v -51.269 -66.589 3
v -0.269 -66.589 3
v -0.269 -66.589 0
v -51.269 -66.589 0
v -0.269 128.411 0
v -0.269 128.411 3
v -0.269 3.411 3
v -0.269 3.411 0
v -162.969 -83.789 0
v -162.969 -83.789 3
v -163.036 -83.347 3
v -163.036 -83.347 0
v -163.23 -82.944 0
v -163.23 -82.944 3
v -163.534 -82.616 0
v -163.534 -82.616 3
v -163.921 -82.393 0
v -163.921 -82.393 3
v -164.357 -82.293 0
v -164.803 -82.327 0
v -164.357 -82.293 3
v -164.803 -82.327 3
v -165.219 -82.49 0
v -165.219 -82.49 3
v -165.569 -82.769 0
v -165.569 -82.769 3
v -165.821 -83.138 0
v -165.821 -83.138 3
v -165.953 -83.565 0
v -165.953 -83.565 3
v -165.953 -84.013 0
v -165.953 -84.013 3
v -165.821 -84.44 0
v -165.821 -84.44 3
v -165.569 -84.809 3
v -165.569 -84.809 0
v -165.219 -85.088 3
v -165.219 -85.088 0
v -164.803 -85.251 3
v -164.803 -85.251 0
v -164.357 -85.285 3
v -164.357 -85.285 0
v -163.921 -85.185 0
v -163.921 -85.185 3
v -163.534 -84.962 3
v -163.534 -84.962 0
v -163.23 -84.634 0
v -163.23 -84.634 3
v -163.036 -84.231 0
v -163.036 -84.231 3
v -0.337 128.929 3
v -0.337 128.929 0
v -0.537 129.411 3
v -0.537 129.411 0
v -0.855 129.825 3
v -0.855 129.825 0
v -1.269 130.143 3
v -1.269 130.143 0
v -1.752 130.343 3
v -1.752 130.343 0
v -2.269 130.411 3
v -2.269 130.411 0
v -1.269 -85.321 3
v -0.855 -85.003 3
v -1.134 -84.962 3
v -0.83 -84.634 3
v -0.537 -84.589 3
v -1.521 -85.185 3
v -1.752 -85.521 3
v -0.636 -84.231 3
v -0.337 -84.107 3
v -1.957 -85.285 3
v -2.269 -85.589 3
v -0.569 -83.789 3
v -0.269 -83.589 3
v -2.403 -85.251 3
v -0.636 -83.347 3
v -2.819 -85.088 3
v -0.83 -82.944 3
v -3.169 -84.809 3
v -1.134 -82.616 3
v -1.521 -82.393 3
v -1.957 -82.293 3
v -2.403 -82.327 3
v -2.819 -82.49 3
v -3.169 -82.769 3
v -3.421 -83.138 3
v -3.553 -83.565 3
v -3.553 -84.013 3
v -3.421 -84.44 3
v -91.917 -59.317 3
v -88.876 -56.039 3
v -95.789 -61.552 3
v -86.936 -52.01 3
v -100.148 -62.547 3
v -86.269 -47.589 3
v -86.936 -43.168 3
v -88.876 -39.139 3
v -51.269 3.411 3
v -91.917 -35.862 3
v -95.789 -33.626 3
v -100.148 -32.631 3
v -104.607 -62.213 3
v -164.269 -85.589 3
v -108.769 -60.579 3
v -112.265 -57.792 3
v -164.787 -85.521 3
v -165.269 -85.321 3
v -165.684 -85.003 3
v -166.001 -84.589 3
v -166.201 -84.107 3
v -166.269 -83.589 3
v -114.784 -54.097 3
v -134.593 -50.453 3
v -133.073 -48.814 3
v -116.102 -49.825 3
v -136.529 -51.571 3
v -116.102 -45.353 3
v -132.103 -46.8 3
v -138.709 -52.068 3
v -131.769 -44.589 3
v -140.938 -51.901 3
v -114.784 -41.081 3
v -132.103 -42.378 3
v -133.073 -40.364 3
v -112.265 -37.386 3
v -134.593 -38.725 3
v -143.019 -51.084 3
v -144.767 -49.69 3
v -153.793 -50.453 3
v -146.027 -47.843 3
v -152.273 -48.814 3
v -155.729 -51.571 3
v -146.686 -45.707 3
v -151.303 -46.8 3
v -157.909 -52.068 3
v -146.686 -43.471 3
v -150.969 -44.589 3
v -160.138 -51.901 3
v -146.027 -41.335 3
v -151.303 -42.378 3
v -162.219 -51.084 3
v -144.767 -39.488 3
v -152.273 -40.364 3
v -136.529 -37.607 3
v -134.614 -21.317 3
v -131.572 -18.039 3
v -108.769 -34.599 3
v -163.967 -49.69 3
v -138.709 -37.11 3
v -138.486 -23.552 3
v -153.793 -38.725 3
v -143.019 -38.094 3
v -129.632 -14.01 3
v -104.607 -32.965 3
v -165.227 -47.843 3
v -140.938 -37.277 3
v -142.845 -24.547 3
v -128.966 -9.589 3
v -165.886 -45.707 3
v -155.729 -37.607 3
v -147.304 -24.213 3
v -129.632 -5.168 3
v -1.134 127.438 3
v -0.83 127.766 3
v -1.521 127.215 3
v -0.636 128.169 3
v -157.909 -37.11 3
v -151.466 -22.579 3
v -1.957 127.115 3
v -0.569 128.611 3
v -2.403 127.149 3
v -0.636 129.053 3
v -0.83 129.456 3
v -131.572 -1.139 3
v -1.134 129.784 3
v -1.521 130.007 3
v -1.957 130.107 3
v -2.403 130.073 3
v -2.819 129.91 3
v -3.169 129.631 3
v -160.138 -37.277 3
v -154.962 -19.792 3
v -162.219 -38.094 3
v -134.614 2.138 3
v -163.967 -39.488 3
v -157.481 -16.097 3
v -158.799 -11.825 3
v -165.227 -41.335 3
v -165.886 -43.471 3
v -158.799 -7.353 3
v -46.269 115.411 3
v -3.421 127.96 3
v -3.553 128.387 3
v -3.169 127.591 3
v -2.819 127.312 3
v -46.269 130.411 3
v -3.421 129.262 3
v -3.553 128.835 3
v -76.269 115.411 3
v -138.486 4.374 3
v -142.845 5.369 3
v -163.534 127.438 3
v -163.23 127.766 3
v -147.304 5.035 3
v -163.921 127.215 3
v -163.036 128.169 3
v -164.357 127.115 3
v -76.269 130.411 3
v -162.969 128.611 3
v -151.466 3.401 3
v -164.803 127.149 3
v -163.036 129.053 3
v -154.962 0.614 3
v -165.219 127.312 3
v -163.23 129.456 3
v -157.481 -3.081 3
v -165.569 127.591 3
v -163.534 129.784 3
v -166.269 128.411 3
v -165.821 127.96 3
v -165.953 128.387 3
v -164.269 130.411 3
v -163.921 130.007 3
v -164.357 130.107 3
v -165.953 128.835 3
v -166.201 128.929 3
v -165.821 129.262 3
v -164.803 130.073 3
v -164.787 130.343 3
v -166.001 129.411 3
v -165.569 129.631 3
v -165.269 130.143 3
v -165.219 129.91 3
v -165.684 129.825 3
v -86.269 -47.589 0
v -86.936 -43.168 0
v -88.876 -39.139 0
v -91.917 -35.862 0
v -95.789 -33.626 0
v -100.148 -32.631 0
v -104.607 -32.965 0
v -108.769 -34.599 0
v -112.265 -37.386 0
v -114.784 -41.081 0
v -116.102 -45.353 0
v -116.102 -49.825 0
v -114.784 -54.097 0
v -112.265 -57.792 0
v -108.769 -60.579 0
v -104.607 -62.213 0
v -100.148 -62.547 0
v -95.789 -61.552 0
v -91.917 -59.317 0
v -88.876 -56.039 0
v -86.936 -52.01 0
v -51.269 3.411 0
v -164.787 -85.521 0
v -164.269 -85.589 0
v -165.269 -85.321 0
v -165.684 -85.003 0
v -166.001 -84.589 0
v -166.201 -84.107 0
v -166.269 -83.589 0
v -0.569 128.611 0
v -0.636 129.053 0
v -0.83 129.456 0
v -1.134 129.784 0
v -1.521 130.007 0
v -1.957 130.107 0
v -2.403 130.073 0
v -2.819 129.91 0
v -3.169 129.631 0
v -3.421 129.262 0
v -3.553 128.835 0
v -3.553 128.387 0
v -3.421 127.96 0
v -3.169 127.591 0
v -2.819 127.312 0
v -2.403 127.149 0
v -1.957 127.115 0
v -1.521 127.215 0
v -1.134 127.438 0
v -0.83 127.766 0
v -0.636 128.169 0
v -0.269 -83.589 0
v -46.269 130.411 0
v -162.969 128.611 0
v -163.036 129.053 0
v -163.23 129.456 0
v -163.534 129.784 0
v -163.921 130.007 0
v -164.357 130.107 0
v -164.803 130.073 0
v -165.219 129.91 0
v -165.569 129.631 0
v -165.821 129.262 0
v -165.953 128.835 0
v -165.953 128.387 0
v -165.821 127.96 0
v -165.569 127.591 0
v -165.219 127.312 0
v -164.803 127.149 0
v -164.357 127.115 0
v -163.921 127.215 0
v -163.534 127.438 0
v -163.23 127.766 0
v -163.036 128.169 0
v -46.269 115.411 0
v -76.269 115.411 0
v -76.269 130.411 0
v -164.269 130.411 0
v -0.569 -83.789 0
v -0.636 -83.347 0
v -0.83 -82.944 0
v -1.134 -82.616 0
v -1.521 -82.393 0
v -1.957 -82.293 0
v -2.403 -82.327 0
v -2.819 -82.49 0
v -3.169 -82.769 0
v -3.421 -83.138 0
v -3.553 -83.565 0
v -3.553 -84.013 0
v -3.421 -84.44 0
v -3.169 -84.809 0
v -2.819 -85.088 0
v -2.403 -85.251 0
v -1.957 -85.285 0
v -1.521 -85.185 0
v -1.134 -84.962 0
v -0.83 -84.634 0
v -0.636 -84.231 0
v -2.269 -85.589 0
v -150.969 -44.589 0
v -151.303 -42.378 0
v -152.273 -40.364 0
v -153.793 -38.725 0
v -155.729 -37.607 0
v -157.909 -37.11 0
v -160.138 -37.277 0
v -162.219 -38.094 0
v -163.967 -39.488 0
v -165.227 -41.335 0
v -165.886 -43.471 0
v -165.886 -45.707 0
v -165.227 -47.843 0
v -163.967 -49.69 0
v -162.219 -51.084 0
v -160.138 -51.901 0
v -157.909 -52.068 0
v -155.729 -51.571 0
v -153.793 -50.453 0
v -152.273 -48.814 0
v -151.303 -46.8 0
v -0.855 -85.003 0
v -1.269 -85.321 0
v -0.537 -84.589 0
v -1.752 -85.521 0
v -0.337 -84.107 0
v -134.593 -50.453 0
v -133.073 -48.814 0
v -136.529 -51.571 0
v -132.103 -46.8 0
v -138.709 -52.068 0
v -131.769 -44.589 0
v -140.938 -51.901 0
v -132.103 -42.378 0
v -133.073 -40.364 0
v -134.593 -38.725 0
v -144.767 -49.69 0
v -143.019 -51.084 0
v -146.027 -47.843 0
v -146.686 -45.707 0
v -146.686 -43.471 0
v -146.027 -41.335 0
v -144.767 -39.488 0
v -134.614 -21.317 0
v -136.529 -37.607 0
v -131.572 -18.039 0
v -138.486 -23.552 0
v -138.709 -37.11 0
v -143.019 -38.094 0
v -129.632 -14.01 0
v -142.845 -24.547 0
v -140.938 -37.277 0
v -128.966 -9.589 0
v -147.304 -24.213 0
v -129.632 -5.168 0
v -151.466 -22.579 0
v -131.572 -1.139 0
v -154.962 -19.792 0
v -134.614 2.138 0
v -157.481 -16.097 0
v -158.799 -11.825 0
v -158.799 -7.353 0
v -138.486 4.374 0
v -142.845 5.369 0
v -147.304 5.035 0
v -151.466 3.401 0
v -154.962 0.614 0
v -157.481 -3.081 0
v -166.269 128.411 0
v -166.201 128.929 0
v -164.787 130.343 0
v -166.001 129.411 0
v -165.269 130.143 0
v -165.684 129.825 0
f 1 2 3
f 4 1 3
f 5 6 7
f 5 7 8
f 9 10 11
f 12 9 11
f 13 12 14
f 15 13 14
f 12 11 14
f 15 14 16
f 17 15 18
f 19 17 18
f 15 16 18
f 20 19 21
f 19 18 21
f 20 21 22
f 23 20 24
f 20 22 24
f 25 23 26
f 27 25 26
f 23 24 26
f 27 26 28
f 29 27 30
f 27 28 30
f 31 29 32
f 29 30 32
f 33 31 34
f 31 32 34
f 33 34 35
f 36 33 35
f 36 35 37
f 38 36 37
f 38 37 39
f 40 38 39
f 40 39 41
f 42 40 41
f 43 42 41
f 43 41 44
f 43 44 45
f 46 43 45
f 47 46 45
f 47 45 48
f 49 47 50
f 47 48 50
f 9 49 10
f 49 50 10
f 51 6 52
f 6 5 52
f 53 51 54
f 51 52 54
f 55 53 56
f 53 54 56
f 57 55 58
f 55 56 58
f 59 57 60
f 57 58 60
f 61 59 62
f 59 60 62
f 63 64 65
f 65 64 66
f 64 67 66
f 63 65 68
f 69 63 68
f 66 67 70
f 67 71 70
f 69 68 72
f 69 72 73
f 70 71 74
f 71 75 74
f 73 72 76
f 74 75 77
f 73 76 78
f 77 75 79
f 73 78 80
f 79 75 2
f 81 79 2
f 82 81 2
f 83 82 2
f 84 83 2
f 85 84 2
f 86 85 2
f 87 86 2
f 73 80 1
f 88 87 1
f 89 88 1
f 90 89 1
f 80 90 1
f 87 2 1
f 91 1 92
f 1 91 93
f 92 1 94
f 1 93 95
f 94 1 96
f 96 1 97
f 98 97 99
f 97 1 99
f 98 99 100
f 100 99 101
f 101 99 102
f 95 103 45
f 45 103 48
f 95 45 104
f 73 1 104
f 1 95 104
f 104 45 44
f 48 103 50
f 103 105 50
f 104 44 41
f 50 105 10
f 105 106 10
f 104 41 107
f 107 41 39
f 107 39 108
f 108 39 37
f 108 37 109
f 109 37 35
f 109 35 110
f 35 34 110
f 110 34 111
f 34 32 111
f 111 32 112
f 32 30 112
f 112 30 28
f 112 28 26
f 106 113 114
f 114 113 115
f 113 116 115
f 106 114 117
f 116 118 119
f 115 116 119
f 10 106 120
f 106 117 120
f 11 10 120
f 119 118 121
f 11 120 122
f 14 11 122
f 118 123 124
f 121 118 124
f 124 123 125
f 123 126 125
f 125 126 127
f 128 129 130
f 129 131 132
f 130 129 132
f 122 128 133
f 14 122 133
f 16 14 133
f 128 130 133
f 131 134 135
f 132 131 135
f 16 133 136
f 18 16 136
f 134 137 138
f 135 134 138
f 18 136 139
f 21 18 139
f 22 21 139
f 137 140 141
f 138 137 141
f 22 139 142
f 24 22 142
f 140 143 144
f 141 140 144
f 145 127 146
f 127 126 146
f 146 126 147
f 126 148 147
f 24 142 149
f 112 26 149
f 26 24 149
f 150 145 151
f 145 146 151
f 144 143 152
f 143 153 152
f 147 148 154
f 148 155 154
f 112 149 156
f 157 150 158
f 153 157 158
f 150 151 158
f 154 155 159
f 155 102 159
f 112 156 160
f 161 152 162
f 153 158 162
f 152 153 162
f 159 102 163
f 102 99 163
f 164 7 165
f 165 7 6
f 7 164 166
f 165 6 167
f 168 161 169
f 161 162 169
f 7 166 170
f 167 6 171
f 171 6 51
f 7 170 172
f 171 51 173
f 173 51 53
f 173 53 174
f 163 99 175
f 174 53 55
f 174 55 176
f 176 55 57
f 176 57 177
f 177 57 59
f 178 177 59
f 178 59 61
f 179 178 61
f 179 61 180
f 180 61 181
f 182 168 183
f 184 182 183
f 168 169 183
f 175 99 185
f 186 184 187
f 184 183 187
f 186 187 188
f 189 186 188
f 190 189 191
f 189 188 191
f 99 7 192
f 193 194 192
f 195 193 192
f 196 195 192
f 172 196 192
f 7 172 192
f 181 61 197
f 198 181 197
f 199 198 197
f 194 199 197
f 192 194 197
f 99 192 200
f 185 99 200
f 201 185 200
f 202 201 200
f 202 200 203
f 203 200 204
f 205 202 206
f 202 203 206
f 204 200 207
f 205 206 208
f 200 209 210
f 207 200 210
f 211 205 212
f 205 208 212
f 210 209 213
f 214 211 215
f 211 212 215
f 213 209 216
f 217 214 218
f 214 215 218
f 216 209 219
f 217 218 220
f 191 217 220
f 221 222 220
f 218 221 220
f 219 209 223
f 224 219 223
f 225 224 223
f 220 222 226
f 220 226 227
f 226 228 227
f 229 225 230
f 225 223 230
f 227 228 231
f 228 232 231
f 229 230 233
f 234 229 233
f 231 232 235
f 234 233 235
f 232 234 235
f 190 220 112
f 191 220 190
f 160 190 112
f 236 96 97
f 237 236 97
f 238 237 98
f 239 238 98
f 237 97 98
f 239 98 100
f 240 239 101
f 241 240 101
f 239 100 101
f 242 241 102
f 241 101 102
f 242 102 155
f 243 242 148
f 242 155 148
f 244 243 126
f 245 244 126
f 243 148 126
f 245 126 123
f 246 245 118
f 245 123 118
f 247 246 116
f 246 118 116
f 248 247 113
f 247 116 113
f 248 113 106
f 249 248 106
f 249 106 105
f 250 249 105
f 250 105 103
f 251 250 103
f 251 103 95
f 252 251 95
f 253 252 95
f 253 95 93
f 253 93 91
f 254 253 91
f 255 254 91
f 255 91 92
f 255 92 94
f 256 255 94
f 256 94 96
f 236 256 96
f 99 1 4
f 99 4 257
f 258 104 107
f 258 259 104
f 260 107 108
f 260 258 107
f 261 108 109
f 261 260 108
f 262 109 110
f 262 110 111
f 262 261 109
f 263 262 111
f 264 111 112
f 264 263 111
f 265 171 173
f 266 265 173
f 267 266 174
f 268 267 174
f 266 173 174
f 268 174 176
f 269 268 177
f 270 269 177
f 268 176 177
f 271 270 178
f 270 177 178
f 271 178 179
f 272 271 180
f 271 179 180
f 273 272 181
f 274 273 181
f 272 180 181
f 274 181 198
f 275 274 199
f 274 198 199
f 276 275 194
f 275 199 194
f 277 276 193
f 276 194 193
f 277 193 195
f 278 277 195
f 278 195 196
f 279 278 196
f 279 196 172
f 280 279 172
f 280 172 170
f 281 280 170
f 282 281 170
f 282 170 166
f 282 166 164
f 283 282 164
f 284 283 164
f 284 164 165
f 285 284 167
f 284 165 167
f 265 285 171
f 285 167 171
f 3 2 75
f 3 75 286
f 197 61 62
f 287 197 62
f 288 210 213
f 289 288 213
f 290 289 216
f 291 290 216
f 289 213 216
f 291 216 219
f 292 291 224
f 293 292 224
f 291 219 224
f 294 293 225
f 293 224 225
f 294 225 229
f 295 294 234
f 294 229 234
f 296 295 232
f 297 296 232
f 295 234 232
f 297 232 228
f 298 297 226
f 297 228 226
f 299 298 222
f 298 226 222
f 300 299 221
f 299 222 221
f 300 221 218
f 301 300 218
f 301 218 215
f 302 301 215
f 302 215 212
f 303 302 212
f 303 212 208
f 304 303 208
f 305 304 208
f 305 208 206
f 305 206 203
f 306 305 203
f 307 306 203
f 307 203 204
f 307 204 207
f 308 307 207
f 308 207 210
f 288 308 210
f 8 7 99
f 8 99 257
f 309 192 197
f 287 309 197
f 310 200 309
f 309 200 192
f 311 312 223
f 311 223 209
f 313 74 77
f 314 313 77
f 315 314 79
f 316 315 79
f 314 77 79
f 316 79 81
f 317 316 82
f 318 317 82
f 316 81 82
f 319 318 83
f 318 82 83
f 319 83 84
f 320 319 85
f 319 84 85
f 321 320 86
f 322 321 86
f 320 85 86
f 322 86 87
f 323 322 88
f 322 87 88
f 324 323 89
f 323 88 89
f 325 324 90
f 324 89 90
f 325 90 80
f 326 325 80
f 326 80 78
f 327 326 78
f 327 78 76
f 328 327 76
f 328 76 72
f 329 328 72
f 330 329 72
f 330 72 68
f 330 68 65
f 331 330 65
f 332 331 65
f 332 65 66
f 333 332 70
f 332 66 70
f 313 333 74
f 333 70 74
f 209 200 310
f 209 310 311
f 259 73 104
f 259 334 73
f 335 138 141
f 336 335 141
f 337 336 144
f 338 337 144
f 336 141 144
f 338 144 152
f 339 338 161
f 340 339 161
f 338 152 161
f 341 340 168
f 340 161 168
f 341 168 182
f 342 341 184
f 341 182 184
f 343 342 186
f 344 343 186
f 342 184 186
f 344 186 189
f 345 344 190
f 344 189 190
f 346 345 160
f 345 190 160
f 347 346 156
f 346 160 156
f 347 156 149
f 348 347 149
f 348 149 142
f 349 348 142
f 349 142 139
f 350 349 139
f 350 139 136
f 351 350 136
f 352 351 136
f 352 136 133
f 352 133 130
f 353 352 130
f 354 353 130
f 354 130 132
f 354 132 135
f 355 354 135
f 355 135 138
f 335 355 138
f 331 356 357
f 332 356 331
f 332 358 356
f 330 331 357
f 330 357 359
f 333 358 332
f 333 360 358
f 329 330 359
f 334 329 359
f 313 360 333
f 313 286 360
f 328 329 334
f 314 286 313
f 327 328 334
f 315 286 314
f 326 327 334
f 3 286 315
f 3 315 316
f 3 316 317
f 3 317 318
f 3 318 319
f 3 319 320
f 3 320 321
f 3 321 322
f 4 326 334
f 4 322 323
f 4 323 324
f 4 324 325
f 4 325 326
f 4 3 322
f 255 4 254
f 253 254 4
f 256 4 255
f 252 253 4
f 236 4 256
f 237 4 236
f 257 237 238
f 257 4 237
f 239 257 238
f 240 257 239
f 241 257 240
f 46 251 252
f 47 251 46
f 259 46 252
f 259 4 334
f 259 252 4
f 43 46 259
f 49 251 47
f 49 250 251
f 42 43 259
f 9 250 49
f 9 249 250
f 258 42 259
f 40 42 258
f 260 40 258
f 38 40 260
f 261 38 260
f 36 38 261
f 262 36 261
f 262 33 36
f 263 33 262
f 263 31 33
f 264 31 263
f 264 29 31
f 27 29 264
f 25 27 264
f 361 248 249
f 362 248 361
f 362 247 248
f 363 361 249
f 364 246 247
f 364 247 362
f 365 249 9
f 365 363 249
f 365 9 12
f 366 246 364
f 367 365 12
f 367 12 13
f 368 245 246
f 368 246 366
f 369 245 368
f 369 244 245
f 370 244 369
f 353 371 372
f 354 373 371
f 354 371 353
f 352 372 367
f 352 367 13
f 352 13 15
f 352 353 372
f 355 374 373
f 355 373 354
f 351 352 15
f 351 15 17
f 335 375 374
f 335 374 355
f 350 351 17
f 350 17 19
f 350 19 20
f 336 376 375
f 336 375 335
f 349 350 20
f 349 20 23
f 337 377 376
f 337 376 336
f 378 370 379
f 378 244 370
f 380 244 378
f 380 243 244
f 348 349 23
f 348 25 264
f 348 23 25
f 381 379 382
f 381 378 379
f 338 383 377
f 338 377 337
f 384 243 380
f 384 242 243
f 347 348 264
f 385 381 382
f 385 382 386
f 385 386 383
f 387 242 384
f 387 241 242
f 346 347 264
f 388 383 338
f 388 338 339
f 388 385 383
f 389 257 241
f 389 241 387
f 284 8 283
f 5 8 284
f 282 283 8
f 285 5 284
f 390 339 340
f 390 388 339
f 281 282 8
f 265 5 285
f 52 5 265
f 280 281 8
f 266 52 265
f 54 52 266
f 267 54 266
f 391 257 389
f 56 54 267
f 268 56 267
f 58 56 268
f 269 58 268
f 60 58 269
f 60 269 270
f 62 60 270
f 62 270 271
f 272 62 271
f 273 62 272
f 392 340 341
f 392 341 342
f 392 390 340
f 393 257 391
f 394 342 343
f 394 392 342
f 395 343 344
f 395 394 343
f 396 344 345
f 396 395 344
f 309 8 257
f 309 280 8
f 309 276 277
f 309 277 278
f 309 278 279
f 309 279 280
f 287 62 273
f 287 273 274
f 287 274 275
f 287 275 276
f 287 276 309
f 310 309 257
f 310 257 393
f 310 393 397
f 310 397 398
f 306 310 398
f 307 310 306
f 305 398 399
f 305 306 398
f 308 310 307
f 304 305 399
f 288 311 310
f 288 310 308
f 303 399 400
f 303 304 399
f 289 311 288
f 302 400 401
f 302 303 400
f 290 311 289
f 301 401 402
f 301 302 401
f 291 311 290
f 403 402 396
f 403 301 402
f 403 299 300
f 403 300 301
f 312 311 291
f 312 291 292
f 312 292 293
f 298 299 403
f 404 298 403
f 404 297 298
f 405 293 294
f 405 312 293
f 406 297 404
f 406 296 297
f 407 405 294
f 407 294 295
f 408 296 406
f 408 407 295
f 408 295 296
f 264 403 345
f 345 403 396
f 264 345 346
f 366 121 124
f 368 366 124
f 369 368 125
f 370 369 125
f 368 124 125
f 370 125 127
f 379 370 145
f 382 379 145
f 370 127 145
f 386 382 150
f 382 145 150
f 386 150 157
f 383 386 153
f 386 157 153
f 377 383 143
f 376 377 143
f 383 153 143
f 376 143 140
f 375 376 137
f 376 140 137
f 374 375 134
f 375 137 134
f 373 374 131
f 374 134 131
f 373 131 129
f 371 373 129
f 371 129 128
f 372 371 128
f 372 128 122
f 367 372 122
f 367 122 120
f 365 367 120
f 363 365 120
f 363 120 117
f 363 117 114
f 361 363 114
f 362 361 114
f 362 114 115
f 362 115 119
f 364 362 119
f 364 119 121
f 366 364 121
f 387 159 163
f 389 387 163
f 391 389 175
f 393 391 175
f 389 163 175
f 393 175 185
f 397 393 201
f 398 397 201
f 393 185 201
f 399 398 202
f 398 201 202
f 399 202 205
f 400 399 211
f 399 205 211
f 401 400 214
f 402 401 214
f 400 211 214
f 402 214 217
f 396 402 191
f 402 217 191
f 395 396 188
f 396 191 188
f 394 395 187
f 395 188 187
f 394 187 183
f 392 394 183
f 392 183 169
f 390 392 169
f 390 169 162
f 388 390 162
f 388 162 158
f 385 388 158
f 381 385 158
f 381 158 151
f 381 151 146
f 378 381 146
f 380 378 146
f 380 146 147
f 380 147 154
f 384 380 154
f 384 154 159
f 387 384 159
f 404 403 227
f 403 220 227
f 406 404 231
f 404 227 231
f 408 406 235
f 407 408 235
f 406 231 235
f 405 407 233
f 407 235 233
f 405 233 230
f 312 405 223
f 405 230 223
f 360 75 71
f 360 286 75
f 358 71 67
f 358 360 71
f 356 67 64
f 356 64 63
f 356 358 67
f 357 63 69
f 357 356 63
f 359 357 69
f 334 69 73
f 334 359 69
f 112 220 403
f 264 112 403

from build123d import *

# Parameters (mm, degrees)
ESQUISSE1_W              = 160
ESQUISSE1_H              = 210
BOSS_EXTRU_1_DEPTH       = 3
CONG_6_R                 = 2
ESQUISSE4_R              = 1.5
ENL_V_MAT_EXTRU_3_DEPTH  = 4
ESQUISSE6_W              = 45
ESQUISSE6_H              = 70
ENL_V_MAT_EXTRU_5_DEPTH  = 4
ESQUISSE7_R              = 15
ENL_V_MAT_EXTRU_6_DEPTH  = 856
ESQUISSE8_R              = 15
ENL_V_MAT_EXTRU_7_DEPTH  = 856
ESQUISSE9_R              = 7.5
ENL_V_MAT_EXTRU_8_DEPTH  = 856
ESQUISSE10_R             = 7.5
ENL_V_MAT_EXTRU_13_DEPTH = 856
ESQUISSE12_W             = 30
ESQUISSE12_H             = 15
ENL_V_MAT_EXTRU_14_DEPTH = 856
ESQUISSE13_W             = 160
ESQUISSE13_H             = 3
BOSS_EXTRU_2_DEPTH       = 3
ESQUISSE14_W             = 3
ESQUISSE14_H             = 213
BOSS_EXTRU_3_DEPTH       = 3
ESQUISSE15_W             = 3
ESQUISSE15_H             = 70
ENL_V_MAT_EXTRU_15_DEPTH = 4
ESQUISSE18_W             = 3
ESQUISSE18_H             = 213
BOSS_EXTRU_4_DEPTH       = 3
ESQUISSE19_W             = 166
ESQUISSE19_H             = 3
BOSS_EXTRU_5_DEPTH       = 3
ESQUISSE20_W             = 3
ESQUISSE20_H             = 70
ENL_V_MAT_EXTRU_16_DEPTH = 3
ESQUISSE21_R             = 1.5
ENL_V_MAT_EXTRU_17_DEPTH = 3
ESQUISSE22_R             = 1.5
ENL_V_MAT_EXTRU_18_DEPTH = 3
ESQUISSE23_R             = 1.5
ENL_V_MAT_EXTRU_19_DEPTH = 3
CONG_7_R                 = 2
CONG_8_R                 = 2
CONG_9_R                 = 2


with BuildPart() as part:
    # Esquisse1 → Boss.-Extru.1 (new body)
    with BuildSketch(Plane.XY):
        with Locations((-86.269341233, 25.410958904)):
            Rectangle(ESQUISSE1_W, ESQUISSE1_H)
    extrude(amount=BOSS_EXTRU_1_DEPTH)

    # Congé6
    cong_6_edges = [part.edges().sort_by_distance(p)[0] for p in [
        (-166.269341233, 130.410958904, 1.5),
    ]]
    fillet(cong_6_edges, radius=CONG_6_R)

    # Esquisse4 → Enlèv. mat.-Extru.3 (cut)
    with BuildSketch(Plane.XY.offset(3)):
        with Locations((-164.469341233, 128.610958904)):
            Circle(ESQUISSE4_R)
    extrude(amount=-ENL_V_MAT_EXTRU_3_DEPTH, mode=Mode.SUBTRACT)

    # Esquisse6 → Enlèv. mat.-Extru.5 (cut)
    with BuildSketch(Plane.XY.offset(3)):
        with Locations((-28.769341233, -31.589041096)):
            Rectangle(ESQUISSE6_W, ESQUISSE6_H)
    extrude(amount=-ENL_V_MAT_EXTRU_5_DEPTH, mode=Mode.SUBTRACT)

    # Esquisse7 → Enlèv. mat.-Extru.6 (cut)
    with BuildSketch(Plane.XY.offset(3)):
        with Locations((-101.269341233, -47.589041096)):
            Circle(ESQUISSE7_R)
    extrude(amount=-ENL_V_MAT_EXTRU_6_DEPTH, mode=Mode.SUBTRACT)

    # Esquisse8 → Enlèv. mat.-Extru.7 (cut)
    with BuildSketch(Plane.XY.offset(3)):
        with Locations((-143.966076441, -9.589041096)):
            Circle(ESQUISSE8_R)
    extrude(amount=-ENL_V_MAT_EXTRU_7_DEPTH, mode=Mode.SUBTRACT)

    # Esquisse9 → Enlèv. mat.-Extru.8 (cut)
    with BuildSketch(Plane.XY.offset(3)):
        with Locations((-139.269341233, -44.589041096)):
            Circle(ESQUISSE9_R)
    extrude(amount=-ENL_V_MAT_EXTRU_8_DEPTH, mode=Mode.SUBTRACT)

    # Esquisse10 → Enlèv. mat.-Extru.13 (cut)
    with BuildSketch(Plane.XY.offset(3)):
        with Locations((-158.469341233, -44.589041096)):
            Circle(ESQUISSE10_R)
    extrude(amount=-ENL_V_MAT_EXTRU_13_DEPTH, mode=Mode.SUBTRACT)

    # Esquisse12 → Enlèv. mat.-Extru.14 (cut)
    with BuildSketch(Plane.XY.offset(3)):
        with Locations((-61.269341233, 122.910958904)):
            Rectangle(ESQUISSE12_W, ESQUISSE12_H)
    extrude(amount=-ENL_V_MAT_EXTRU_14_DEPTH, mode=Mode.SUBTRACT)

    # Esquisse13 → Boss.-Extru.2 (add)
    with BuildSketch(Plane.XZ.offset(79.589041096)):
        with Locations((-86.269341233, 1.5)):
            Rectangle(ESQUISSE13_W, ESQUISSE13_H)
    extrude(amount=BOSS_EXTRU_2_DEPTH)

    # Esquisse14 → Boss.-Extru.3 (add)
    with BuildSketch(Plane(origin=(-6.269341233, 0, 0), x_dir=(0, 0, -1), z_dir=(1, 0, 0))):
        with Locations((-1.5, 23.910958904)):
            Rectangle(ESQUISSE14_W, ESQUISSE14_H)
    extrude(amount=BOSS_EXTRU_3_DEPTH)

    # Esquisse15 → Enlèv. mat.-Extru.15 (cut)
    with BuildSketch(Plane(origin=(-3.269341233, 0, 0), x_dir=(0, 0, -1), z_dir=(1, 0, 0))):
        with Locations((-1.5, -31.589041096)):
            Rectangle(ESQUISSE15_W, ESQUISSE15_H)
    extrude(amount=-ENL_V_MAT_EXTRU_15_DEPTH, mode=Mode.SUBTRACT)

    # Esquisse18 → Boss.-Extru.4 (add)
    with BuildSketch(Plane(origin=(-3.269341233, 0, 0), x_dir=(0, 0, -1), z_dir=(1, 0, 0))):
        with Locations((-1.5, 23.910958904)):
            Rectangle(ESQUISSE18_W, ESQUISSE18_H)
    extrude(amount=BOSS_EXTRU_4_DEPTH)

    # Esquisse19 → Boss.-Extru.5 (add)
    with BuildSketch(Plane(origin=(0, -82.589041096, 0), x_dir=(-1, 0, 0), z_dir=(0, -1, 0))):
        with Locations((83.269341233, -1.5)):
            Rectangle(ESQUISSE19_W, ESQUISSE19_H)
    extrude(amount=BOSS_EXTRU_5_DEPTH)

    # Esquisse20 → Enlèv. mat.-Extru.16 (cut)
    with BuildSketch(Plane(origin=(-0.269341233, 0, 0), x_dir=(0, 0, -1), z_dir=(1, 0, 0))):
        with Locations((-1.5, -31.589041096)):
            Rectangle(ESQUISSE20_W, ESQUISSE20_H)
    extrude(amount=-ENL_V_MAT_EXTRU_16_DEPTH, mode=Mode.SUBTRACT)

    # Esquisse21 → Enlèv. mat.-Extru.17 (cut)
    with BuildSketch(Plane.XY.offset(3)):
        with Locations((-2.069341233, 128.610958904)):
            Circle(ESQUISSE21_R)
    extrude(amount=-ENL_V_MAT_EXTRU_17_DEPTH, mode=Mode.SUBTRACT)

    # Esquisse22 → Enlèv. mat.-Extru.18 (cut)
    with BuildSketch(Plane.XY.offset(3)):
        with Locations((-2.069341233, -83.789041096)):
            Circle(ESQUISSE22_R)
    extrude(amount=-ENL_V_MAT_EXTRU_18_DEPTH, mode=Mode.SUBTRACT)

    # Esquisse23 → Enlèv. mat.-Extru.19 (cut)
    with BuildSketch(Plane.XY.offset(3)):
        with Locations((-164.469341233, -83.789041096)):
            Circle(ESQUISSE23_R)
    extrude(amount=-ENL_V_MAT_EXTRU_19_DEPTH, mode=Mode.SUBTRACT)

    # Congé7
    cong_7_edges = [part.edges().sort_by_distance(p)[0] for p in [
        (-0.269341233, -85.589041096, 1.5),
    ]]
    fillet(cong_7_edges, radius=CONG_7_R)

    # Congé8
    cong_8_edges = [part.edges().sort_by_distance(p)[0] for p in [
        (-0.269341233, 130.410958904, 1.5),
    ]]
    fillet(cong_8_edges, radius=CONG_8_R)

    # Congé9
    cong_9_edges = [part.edges().sort_by_distance(p)[0] for p in [
        (-166.269341233, -85.589041096, 1.5),
    ]]
    fillet(cong_9_edges, radius=CONG_9_R)


solid = part.part
